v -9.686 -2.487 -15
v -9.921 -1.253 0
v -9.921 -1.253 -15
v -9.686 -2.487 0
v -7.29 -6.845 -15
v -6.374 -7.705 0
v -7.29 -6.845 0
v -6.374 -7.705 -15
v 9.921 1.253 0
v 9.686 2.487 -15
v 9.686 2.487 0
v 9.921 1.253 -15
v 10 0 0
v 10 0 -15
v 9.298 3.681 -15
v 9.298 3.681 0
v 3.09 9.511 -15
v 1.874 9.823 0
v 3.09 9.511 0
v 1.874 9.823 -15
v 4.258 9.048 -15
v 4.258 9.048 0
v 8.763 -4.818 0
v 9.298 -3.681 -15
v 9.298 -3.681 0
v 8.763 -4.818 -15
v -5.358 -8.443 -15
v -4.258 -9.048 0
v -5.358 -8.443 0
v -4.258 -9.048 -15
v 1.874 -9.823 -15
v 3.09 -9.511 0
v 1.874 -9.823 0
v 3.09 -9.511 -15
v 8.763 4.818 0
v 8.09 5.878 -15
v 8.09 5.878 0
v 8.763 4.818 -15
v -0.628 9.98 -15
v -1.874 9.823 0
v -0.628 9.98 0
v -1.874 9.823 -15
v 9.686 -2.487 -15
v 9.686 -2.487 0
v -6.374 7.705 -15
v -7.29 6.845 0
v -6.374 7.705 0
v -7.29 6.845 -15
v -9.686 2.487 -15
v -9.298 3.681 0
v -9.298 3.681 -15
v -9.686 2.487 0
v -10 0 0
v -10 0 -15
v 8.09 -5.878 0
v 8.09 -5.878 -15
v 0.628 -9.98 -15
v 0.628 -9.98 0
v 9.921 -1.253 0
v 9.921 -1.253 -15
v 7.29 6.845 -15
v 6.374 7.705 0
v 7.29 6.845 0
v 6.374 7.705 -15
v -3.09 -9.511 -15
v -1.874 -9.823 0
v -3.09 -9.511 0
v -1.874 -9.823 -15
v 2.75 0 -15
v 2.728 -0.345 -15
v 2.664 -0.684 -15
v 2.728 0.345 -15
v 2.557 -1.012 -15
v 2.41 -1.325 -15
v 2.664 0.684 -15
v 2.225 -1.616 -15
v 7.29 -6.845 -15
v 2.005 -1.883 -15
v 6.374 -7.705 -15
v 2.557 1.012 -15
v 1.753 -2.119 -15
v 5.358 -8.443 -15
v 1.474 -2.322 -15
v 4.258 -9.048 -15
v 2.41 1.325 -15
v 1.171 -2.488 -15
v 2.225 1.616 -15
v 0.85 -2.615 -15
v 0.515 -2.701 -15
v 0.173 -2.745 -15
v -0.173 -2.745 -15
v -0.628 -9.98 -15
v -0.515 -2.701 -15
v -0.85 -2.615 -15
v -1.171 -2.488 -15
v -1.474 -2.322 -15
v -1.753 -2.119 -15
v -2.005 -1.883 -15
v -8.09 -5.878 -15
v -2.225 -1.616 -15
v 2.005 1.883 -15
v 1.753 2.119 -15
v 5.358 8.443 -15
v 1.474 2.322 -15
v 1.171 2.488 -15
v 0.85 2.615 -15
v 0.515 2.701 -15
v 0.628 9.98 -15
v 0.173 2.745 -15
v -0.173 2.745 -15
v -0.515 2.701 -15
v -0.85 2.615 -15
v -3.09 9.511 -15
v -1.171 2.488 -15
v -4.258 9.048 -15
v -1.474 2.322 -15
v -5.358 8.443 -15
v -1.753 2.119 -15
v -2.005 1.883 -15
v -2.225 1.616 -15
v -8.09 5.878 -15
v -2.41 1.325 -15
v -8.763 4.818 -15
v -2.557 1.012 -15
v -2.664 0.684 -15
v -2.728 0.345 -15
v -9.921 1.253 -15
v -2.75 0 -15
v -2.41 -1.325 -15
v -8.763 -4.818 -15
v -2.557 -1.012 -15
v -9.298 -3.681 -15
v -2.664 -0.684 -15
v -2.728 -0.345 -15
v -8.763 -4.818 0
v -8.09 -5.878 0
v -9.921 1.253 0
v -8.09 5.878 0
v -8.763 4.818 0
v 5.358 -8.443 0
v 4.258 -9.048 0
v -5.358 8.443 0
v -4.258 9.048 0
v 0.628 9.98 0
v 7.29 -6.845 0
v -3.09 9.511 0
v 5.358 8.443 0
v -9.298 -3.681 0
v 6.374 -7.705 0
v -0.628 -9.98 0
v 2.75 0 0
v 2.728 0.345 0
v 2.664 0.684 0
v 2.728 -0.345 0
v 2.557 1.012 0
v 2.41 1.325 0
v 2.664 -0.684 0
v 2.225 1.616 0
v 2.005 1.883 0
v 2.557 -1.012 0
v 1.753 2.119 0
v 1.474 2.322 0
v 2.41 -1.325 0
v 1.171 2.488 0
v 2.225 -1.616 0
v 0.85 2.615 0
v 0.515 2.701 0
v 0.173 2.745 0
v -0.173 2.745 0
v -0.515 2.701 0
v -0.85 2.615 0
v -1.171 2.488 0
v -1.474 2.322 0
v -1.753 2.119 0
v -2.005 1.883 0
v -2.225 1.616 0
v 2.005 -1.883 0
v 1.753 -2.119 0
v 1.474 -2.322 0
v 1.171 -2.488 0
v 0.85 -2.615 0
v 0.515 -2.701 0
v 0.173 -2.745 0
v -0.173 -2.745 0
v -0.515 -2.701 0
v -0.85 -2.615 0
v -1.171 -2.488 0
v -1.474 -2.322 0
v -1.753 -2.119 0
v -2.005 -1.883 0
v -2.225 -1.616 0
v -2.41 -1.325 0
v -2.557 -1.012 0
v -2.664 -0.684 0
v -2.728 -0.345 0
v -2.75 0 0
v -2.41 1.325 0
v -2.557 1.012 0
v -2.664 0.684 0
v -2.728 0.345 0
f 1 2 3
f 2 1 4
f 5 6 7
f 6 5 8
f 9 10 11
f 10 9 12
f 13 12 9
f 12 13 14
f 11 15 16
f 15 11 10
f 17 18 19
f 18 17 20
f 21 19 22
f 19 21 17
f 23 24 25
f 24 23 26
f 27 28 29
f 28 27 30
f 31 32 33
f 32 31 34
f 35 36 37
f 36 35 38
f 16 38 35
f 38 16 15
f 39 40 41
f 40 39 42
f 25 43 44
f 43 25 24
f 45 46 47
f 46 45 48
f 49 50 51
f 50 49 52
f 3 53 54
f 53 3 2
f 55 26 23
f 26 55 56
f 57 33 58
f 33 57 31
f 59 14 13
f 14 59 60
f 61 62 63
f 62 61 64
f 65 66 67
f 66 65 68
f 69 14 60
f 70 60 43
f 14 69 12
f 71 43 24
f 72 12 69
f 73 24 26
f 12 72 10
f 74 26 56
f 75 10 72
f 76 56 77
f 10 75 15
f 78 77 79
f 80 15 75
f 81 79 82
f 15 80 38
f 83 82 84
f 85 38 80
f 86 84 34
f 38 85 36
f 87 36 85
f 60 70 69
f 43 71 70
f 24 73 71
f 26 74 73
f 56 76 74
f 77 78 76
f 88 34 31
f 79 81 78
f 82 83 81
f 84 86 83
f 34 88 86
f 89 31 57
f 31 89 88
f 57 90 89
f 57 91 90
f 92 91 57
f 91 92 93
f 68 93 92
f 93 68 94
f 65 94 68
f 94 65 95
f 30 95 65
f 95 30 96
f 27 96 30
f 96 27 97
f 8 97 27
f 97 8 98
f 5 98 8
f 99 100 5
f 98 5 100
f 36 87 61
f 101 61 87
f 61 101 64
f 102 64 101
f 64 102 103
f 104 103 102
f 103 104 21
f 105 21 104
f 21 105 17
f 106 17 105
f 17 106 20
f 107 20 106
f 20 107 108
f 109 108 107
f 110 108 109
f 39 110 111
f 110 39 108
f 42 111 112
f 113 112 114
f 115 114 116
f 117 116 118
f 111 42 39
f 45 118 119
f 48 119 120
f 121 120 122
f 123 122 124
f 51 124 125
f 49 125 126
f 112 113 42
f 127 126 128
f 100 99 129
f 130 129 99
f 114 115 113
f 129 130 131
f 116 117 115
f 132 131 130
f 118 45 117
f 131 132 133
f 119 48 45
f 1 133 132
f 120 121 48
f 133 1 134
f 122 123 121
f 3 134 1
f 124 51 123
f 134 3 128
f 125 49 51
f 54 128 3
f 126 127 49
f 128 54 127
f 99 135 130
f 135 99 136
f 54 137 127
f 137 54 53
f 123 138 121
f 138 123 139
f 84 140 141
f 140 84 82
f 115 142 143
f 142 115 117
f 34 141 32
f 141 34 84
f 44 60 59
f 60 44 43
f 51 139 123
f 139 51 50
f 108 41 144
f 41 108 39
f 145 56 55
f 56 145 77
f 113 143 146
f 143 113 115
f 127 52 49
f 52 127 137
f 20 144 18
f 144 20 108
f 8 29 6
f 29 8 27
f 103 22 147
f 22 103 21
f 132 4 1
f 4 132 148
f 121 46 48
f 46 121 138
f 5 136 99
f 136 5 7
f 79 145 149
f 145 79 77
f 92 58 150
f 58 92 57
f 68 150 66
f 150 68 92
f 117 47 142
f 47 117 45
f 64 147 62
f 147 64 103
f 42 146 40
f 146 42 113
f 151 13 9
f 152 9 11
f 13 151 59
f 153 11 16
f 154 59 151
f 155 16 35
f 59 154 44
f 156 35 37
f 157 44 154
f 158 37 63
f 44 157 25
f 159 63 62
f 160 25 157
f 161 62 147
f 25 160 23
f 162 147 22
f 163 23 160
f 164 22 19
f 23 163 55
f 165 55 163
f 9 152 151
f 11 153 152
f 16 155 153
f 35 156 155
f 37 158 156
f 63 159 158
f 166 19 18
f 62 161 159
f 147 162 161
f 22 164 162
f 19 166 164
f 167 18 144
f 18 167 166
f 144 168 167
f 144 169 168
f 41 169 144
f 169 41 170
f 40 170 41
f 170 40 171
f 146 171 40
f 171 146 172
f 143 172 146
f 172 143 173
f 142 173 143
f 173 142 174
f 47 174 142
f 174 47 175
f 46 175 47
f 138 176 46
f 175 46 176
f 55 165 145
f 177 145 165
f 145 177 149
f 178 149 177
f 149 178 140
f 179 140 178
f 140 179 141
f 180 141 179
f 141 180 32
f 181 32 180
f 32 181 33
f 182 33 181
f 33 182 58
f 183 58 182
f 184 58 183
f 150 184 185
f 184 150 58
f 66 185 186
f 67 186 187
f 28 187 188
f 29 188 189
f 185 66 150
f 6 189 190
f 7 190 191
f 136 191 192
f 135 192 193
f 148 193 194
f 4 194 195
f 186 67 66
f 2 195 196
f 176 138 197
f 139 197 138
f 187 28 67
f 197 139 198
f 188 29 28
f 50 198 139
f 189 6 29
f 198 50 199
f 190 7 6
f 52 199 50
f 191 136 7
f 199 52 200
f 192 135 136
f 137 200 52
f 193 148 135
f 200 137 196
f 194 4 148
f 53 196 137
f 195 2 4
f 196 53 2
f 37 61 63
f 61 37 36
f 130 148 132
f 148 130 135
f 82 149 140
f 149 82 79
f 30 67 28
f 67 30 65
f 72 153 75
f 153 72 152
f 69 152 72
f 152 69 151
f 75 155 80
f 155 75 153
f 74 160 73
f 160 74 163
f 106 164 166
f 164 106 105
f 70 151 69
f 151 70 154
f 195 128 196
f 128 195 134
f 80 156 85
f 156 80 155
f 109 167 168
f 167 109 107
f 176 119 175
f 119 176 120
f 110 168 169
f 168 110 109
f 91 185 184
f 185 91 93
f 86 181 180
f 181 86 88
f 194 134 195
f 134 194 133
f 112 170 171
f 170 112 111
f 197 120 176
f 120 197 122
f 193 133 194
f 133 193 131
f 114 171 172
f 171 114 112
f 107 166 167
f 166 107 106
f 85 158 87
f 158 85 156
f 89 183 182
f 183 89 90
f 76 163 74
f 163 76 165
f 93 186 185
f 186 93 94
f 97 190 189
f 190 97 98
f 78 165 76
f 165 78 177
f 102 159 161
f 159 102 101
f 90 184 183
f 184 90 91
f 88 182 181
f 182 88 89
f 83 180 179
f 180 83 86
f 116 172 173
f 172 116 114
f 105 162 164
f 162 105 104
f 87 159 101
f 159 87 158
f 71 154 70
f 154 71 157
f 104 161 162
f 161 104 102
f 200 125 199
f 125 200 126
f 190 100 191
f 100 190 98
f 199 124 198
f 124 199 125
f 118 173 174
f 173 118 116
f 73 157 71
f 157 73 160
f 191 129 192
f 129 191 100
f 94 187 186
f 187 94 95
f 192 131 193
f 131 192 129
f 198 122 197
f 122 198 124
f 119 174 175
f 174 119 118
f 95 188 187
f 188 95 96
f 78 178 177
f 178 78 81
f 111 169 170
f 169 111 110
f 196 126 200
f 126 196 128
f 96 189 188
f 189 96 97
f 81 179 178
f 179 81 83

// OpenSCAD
$fn = 50;


difference() {
	union() {
		translate(v = [0, 0, -15.0000000000]) {
			cylinder(h = 15, r = 10.0000000000);
		}
		cylinder(h = 0, r = 16.0000000000);
	}
	union() {
		#translate(v = [0, 0, -15]) {
			cylinder(h = 15, r = 2.7500000000);
		}
	}
}
